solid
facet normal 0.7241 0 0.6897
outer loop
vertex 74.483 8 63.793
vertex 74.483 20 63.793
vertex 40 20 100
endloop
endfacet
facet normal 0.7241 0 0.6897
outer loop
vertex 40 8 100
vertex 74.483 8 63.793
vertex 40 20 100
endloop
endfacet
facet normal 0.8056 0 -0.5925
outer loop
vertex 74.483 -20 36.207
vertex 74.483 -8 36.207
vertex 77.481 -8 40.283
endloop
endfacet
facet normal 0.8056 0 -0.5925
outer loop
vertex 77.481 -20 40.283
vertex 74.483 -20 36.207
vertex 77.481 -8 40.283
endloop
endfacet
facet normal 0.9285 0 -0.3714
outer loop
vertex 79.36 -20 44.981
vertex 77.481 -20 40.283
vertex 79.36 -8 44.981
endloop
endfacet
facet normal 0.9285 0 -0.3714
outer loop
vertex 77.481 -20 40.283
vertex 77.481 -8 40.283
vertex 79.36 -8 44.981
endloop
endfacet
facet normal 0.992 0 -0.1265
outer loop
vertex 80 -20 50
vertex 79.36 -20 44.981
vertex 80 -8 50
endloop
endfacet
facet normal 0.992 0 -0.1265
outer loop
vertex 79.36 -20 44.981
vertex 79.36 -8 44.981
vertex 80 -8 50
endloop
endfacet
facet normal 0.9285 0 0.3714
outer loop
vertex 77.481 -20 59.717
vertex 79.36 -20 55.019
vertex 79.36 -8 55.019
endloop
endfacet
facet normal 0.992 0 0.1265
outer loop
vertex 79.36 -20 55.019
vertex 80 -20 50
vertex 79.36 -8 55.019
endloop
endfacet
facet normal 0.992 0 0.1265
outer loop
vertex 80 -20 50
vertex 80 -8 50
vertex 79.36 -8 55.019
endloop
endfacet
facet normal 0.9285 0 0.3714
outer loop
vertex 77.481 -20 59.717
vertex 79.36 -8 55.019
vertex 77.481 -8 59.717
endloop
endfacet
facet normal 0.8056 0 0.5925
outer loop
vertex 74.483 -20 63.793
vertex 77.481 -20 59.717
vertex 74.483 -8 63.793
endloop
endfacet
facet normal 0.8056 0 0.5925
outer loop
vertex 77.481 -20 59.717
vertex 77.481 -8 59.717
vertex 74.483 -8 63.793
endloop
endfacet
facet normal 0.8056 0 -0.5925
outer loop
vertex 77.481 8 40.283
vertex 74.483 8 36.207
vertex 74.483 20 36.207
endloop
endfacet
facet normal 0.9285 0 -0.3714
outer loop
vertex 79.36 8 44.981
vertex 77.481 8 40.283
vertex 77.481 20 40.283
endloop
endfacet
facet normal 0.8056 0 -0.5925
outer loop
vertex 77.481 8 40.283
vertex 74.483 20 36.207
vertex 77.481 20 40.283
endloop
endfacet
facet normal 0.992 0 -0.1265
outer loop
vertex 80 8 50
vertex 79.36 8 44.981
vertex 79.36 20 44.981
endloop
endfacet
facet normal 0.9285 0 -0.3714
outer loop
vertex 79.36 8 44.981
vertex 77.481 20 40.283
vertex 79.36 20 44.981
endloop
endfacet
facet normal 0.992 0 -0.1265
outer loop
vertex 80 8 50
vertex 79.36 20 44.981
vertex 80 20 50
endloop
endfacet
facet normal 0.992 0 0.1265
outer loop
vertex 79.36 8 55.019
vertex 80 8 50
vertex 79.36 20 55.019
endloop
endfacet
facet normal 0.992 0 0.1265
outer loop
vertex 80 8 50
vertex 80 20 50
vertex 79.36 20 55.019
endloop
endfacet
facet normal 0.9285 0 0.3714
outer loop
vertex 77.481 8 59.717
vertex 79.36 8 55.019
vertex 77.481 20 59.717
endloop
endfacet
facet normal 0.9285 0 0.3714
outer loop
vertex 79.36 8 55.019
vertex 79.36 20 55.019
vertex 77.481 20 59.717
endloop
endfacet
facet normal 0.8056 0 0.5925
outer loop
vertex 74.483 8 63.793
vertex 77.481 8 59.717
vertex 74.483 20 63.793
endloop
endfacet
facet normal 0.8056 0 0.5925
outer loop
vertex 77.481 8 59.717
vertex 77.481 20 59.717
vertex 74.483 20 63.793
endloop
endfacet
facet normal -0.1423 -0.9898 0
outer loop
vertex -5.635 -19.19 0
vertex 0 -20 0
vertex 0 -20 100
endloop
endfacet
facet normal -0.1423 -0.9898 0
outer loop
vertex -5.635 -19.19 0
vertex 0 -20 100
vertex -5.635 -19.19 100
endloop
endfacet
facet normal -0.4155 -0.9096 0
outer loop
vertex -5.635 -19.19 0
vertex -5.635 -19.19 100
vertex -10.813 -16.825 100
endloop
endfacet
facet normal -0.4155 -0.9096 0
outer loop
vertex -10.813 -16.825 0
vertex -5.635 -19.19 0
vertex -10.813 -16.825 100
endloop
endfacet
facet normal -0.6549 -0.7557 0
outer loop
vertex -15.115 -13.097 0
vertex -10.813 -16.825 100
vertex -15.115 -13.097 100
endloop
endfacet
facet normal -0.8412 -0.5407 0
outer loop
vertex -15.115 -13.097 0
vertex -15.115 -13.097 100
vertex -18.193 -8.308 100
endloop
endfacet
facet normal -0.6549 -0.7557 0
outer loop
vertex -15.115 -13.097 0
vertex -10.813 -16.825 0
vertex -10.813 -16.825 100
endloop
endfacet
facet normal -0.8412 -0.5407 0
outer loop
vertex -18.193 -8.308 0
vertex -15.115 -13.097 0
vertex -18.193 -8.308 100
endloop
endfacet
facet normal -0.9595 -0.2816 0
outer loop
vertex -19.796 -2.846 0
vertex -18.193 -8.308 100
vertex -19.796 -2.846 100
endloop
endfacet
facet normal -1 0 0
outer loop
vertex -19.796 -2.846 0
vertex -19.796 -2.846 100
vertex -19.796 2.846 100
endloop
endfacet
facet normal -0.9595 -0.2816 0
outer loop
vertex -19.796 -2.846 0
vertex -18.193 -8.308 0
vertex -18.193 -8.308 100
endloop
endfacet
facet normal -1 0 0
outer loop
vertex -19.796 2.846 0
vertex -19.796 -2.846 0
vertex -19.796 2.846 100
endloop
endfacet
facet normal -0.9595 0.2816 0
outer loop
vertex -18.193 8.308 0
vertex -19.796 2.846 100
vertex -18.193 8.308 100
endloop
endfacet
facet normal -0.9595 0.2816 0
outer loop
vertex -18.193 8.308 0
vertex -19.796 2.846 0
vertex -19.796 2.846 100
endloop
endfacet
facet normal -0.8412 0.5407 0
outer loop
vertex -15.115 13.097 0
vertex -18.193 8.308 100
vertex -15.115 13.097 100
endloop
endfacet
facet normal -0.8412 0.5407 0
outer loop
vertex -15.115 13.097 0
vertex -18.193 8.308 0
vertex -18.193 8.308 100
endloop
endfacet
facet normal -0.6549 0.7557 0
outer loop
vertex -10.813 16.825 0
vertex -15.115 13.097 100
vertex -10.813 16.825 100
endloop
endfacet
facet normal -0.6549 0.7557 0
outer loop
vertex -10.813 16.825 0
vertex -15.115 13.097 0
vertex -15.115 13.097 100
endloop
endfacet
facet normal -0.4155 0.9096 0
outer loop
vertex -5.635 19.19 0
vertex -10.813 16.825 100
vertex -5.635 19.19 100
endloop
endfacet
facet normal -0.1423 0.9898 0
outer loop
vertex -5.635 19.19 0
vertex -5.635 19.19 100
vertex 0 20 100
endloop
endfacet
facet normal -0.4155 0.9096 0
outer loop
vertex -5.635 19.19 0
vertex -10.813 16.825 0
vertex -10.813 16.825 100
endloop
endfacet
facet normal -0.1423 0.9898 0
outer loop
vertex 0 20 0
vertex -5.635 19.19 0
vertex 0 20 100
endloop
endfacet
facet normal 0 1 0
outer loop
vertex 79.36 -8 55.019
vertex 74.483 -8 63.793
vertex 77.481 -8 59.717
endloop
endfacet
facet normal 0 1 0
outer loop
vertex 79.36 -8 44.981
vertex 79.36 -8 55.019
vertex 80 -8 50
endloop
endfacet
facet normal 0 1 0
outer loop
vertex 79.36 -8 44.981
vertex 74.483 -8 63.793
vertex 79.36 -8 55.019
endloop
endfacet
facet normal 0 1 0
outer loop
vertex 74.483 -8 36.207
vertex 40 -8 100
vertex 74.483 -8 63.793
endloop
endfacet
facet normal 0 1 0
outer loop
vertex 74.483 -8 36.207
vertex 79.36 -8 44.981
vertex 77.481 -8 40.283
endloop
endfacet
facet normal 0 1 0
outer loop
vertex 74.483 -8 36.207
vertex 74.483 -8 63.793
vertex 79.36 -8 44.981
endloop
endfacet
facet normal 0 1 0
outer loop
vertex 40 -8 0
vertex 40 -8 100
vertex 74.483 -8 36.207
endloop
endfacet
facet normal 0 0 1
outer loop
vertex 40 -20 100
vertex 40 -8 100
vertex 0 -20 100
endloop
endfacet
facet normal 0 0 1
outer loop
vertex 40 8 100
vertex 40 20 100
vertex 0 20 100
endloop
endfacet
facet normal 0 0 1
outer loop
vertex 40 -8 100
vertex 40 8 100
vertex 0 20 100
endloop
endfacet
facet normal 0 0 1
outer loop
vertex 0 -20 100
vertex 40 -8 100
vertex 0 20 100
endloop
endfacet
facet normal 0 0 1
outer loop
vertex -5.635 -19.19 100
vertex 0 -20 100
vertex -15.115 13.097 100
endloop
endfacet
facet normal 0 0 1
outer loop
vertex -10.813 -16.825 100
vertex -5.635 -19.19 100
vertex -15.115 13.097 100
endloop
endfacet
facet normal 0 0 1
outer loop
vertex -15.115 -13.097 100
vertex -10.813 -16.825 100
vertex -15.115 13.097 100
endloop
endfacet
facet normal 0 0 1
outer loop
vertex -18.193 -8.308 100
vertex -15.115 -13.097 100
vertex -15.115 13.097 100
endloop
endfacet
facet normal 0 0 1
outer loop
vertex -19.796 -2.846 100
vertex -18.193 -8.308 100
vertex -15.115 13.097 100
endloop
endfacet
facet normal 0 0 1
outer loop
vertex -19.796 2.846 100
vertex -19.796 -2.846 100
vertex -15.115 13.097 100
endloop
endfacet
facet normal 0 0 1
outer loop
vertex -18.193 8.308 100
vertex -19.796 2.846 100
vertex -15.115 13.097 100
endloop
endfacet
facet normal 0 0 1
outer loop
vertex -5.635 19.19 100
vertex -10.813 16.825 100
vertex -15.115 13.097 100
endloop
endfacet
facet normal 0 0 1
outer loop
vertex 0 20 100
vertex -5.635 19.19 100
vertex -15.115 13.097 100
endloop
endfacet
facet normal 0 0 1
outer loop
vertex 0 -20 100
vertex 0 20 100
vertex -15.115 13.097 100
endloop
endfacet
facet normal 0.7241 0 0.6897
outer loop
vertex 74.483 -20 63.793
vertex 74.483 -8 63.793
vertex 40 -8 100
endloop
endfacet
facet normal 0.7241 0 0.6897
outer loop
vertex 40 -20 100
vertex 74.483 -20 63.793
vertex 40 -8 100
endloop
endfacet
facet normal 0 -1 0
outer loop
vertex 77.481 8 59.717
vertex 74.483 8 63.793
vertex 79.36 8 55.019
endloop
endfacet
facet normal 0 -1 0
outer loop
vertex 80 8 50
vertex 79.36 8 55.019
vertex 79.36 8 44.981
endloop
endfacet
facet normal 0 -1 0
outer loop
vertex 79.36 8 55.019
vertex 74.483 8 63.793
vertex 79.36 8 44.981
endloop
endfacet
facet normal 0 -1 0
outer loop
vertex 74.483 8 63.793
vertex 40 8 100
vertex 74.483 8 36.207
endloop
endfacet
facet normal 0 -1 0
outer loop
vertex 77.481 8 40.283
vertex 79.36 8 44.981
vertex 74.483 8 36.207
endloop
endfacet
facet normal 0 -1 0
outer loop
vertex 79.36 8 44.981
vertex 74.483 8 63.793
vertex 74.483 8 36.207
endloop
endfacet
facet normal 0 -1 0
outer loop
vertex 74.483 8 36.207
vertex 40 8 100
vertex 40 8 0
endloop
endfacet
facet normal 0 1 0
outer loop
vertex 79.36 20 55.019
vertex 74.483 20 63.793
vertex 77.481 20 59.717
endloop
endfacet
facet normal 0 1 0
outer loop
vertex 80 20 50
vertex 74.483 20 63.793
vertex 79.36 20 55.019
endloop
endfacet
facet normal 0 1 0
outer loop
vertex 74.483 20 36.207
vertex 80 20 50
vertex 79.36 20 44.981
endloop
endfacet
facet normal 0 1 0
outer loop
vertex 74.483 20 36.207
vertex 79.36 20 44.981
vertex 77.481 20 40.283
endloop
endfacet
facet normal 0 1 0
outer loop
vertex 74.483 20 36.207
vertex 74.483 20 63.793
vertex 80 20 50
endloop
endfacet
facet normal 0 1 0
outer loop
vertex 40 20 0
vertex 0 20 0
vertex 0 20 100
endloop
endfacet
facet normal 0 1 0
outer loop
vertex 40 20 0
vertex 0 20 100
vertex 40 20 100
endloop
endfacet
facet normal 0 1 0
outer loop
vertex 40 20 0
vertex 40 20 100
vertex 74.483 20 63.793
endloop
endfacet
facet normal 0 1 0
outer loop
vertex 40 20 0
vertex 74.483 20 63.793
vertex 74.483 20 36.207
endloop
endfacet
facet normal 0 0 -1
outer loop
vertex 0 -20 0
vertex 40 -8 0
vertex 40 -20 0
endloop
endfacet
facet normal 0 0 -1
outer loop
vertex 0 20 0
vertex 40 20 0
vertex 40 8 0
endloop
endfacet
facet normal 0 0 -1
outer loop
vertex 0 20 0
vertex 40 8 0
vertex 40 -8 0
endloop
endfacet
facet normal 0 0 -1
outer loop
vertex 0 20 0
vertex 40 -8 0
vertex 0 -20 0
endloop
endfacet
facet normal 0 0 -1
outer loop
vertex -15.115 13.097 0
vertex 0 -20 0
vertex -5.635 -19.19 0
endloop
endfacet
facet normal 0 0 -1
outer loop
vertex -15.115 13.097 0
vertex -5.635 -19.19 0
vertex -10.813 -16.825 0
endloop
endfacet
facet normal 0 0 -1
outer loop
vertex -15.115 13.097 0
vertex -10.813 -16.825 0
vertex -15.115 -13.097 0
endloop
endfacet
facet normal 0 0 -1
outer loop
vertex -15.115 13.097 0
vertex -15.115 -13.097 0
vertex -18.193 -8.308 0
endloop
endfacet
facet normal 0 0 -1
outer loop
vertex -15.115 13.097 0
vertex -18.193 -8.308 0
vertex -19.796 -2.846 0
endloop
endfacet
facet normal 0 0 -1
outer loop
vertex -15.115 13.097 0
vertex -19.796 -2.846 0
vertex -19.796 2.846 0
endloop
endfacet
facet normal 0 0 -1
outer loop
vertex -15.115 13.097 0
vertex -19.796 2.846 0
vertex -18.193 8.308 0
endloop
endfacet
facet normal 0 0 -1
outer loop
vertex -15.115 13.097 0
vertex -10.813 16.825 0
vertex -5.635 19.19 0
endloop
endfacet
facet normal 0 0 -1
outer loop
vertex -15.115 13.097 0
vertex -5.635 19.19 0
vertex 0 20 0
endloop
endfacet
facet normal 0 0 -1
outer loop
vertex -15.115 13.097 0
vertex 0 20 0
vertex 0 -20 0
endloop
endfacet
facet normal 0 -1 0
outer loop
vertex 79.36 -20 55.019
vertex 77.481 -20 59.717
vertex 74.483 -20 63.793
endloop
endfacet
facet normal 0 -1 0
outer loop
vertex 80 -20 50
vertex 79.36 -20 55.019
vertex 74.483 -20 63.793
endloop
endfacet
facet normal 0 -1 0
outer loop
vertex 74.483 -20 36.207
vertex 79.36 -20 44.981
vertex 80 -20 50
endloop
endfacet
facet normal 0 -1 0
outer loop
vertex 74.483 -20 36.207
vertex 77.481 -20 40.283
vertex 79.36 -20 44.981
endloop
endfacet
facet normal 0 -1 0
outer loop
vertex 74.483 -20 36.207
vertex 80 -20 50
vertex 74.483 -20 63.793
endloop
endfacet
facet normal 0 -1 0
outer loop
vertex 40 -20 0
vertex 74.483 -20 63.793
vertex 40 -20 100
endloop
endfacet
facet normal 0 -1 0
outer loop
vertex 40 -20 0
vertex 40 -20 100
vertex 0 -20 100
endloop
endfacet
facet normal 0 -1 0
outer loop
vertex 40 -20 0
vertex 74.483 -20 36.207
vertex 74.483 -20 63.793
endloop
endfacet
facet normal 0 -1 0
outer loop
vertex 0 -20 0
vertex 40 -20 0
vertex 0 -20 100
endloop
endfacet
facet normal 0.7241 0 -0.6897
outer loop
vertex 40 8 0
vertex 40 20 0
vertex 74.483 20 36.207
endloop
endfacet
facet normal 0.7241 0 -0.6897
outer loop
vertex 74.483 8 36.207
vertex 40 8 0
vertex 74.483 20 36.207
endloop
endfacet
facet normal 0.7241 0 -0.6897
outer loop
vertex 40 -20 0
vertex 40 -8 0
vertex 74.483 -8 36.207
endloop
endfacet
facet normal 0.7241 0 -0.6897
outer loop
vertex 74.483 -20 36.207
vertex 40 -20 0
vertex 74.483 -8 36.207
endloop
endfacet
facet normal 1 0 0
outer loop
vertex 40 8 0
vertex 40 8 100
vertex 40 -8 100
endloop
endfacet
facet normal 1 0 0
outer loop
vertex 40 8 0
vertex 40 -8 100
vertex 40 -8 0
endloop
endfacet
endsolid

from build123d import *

# Parameters (mm, degrees)
EXTRUDE_1_DEPTH     = 100
CUT_EXTRUDE_1_DEPTH = 100
SKETCH_5_W          = 43.975139672
SKETCH_5_H          = 100.104675822
CUT_EXTRUDE_3_DEPTH = 8


with BuildPart() as part:
    # 草图2 → 凸台-拉伸1 (new body)
    with BuildSketch(Plane.XY):
        with BuildLine():
            Line((0, 20), (80, 20))
            Line((80, 20), (80, -20))
            Line((80, -20), (0, -20))
            ThreePointArc((0, -20), (-20, 0), (0, 20))
        make_face()
    extrude(amount=EXTRUDE_1_DEPTH)

    # 草图3 → 切除-拉伸1 (cut)
    with BuildSketch(Plane(origin=(0, 20, 0), x_dir=(1, 0, 0), z_dir=(0, 1, 0))):
        with BuildLine():
            Line((40, 0), (74.482758502, -36.206896811))
            ThreePointArc((74.482758502, -36.206896811), (79.999999735, -50), (74.482758502, -63.793103189))
            Line((74.482758502, -63.793103189), (40, -100))
            Line((40, -100), (91.714369415, -100))
            Line((91.714369415, -100), (91.714369415, 0))
            Line((91.714369415, 0), (40, 0))
        make_face()
    extrude(amount=-CUT_EXTRUDE_1_DEPTH, mode=Mode.SUBTRACT)

    # 草图5 → 切除-拉伸3 (cut, symmetric)
    with BuildSketch(Plane(origin=(0, 0, 0), x_dir=(1, 0, 0), z_dir=(0, 1, 0))):
        with Locations((61.987569836, -50.052337911)):
            Rectangle(SKETCH_5_W, SKETCH_5_H)
    extrude(amount=CUT_EXTRUDE_3_DEPTH, both=True, mode=Mode.SUBTRACT)


solid = part.part
